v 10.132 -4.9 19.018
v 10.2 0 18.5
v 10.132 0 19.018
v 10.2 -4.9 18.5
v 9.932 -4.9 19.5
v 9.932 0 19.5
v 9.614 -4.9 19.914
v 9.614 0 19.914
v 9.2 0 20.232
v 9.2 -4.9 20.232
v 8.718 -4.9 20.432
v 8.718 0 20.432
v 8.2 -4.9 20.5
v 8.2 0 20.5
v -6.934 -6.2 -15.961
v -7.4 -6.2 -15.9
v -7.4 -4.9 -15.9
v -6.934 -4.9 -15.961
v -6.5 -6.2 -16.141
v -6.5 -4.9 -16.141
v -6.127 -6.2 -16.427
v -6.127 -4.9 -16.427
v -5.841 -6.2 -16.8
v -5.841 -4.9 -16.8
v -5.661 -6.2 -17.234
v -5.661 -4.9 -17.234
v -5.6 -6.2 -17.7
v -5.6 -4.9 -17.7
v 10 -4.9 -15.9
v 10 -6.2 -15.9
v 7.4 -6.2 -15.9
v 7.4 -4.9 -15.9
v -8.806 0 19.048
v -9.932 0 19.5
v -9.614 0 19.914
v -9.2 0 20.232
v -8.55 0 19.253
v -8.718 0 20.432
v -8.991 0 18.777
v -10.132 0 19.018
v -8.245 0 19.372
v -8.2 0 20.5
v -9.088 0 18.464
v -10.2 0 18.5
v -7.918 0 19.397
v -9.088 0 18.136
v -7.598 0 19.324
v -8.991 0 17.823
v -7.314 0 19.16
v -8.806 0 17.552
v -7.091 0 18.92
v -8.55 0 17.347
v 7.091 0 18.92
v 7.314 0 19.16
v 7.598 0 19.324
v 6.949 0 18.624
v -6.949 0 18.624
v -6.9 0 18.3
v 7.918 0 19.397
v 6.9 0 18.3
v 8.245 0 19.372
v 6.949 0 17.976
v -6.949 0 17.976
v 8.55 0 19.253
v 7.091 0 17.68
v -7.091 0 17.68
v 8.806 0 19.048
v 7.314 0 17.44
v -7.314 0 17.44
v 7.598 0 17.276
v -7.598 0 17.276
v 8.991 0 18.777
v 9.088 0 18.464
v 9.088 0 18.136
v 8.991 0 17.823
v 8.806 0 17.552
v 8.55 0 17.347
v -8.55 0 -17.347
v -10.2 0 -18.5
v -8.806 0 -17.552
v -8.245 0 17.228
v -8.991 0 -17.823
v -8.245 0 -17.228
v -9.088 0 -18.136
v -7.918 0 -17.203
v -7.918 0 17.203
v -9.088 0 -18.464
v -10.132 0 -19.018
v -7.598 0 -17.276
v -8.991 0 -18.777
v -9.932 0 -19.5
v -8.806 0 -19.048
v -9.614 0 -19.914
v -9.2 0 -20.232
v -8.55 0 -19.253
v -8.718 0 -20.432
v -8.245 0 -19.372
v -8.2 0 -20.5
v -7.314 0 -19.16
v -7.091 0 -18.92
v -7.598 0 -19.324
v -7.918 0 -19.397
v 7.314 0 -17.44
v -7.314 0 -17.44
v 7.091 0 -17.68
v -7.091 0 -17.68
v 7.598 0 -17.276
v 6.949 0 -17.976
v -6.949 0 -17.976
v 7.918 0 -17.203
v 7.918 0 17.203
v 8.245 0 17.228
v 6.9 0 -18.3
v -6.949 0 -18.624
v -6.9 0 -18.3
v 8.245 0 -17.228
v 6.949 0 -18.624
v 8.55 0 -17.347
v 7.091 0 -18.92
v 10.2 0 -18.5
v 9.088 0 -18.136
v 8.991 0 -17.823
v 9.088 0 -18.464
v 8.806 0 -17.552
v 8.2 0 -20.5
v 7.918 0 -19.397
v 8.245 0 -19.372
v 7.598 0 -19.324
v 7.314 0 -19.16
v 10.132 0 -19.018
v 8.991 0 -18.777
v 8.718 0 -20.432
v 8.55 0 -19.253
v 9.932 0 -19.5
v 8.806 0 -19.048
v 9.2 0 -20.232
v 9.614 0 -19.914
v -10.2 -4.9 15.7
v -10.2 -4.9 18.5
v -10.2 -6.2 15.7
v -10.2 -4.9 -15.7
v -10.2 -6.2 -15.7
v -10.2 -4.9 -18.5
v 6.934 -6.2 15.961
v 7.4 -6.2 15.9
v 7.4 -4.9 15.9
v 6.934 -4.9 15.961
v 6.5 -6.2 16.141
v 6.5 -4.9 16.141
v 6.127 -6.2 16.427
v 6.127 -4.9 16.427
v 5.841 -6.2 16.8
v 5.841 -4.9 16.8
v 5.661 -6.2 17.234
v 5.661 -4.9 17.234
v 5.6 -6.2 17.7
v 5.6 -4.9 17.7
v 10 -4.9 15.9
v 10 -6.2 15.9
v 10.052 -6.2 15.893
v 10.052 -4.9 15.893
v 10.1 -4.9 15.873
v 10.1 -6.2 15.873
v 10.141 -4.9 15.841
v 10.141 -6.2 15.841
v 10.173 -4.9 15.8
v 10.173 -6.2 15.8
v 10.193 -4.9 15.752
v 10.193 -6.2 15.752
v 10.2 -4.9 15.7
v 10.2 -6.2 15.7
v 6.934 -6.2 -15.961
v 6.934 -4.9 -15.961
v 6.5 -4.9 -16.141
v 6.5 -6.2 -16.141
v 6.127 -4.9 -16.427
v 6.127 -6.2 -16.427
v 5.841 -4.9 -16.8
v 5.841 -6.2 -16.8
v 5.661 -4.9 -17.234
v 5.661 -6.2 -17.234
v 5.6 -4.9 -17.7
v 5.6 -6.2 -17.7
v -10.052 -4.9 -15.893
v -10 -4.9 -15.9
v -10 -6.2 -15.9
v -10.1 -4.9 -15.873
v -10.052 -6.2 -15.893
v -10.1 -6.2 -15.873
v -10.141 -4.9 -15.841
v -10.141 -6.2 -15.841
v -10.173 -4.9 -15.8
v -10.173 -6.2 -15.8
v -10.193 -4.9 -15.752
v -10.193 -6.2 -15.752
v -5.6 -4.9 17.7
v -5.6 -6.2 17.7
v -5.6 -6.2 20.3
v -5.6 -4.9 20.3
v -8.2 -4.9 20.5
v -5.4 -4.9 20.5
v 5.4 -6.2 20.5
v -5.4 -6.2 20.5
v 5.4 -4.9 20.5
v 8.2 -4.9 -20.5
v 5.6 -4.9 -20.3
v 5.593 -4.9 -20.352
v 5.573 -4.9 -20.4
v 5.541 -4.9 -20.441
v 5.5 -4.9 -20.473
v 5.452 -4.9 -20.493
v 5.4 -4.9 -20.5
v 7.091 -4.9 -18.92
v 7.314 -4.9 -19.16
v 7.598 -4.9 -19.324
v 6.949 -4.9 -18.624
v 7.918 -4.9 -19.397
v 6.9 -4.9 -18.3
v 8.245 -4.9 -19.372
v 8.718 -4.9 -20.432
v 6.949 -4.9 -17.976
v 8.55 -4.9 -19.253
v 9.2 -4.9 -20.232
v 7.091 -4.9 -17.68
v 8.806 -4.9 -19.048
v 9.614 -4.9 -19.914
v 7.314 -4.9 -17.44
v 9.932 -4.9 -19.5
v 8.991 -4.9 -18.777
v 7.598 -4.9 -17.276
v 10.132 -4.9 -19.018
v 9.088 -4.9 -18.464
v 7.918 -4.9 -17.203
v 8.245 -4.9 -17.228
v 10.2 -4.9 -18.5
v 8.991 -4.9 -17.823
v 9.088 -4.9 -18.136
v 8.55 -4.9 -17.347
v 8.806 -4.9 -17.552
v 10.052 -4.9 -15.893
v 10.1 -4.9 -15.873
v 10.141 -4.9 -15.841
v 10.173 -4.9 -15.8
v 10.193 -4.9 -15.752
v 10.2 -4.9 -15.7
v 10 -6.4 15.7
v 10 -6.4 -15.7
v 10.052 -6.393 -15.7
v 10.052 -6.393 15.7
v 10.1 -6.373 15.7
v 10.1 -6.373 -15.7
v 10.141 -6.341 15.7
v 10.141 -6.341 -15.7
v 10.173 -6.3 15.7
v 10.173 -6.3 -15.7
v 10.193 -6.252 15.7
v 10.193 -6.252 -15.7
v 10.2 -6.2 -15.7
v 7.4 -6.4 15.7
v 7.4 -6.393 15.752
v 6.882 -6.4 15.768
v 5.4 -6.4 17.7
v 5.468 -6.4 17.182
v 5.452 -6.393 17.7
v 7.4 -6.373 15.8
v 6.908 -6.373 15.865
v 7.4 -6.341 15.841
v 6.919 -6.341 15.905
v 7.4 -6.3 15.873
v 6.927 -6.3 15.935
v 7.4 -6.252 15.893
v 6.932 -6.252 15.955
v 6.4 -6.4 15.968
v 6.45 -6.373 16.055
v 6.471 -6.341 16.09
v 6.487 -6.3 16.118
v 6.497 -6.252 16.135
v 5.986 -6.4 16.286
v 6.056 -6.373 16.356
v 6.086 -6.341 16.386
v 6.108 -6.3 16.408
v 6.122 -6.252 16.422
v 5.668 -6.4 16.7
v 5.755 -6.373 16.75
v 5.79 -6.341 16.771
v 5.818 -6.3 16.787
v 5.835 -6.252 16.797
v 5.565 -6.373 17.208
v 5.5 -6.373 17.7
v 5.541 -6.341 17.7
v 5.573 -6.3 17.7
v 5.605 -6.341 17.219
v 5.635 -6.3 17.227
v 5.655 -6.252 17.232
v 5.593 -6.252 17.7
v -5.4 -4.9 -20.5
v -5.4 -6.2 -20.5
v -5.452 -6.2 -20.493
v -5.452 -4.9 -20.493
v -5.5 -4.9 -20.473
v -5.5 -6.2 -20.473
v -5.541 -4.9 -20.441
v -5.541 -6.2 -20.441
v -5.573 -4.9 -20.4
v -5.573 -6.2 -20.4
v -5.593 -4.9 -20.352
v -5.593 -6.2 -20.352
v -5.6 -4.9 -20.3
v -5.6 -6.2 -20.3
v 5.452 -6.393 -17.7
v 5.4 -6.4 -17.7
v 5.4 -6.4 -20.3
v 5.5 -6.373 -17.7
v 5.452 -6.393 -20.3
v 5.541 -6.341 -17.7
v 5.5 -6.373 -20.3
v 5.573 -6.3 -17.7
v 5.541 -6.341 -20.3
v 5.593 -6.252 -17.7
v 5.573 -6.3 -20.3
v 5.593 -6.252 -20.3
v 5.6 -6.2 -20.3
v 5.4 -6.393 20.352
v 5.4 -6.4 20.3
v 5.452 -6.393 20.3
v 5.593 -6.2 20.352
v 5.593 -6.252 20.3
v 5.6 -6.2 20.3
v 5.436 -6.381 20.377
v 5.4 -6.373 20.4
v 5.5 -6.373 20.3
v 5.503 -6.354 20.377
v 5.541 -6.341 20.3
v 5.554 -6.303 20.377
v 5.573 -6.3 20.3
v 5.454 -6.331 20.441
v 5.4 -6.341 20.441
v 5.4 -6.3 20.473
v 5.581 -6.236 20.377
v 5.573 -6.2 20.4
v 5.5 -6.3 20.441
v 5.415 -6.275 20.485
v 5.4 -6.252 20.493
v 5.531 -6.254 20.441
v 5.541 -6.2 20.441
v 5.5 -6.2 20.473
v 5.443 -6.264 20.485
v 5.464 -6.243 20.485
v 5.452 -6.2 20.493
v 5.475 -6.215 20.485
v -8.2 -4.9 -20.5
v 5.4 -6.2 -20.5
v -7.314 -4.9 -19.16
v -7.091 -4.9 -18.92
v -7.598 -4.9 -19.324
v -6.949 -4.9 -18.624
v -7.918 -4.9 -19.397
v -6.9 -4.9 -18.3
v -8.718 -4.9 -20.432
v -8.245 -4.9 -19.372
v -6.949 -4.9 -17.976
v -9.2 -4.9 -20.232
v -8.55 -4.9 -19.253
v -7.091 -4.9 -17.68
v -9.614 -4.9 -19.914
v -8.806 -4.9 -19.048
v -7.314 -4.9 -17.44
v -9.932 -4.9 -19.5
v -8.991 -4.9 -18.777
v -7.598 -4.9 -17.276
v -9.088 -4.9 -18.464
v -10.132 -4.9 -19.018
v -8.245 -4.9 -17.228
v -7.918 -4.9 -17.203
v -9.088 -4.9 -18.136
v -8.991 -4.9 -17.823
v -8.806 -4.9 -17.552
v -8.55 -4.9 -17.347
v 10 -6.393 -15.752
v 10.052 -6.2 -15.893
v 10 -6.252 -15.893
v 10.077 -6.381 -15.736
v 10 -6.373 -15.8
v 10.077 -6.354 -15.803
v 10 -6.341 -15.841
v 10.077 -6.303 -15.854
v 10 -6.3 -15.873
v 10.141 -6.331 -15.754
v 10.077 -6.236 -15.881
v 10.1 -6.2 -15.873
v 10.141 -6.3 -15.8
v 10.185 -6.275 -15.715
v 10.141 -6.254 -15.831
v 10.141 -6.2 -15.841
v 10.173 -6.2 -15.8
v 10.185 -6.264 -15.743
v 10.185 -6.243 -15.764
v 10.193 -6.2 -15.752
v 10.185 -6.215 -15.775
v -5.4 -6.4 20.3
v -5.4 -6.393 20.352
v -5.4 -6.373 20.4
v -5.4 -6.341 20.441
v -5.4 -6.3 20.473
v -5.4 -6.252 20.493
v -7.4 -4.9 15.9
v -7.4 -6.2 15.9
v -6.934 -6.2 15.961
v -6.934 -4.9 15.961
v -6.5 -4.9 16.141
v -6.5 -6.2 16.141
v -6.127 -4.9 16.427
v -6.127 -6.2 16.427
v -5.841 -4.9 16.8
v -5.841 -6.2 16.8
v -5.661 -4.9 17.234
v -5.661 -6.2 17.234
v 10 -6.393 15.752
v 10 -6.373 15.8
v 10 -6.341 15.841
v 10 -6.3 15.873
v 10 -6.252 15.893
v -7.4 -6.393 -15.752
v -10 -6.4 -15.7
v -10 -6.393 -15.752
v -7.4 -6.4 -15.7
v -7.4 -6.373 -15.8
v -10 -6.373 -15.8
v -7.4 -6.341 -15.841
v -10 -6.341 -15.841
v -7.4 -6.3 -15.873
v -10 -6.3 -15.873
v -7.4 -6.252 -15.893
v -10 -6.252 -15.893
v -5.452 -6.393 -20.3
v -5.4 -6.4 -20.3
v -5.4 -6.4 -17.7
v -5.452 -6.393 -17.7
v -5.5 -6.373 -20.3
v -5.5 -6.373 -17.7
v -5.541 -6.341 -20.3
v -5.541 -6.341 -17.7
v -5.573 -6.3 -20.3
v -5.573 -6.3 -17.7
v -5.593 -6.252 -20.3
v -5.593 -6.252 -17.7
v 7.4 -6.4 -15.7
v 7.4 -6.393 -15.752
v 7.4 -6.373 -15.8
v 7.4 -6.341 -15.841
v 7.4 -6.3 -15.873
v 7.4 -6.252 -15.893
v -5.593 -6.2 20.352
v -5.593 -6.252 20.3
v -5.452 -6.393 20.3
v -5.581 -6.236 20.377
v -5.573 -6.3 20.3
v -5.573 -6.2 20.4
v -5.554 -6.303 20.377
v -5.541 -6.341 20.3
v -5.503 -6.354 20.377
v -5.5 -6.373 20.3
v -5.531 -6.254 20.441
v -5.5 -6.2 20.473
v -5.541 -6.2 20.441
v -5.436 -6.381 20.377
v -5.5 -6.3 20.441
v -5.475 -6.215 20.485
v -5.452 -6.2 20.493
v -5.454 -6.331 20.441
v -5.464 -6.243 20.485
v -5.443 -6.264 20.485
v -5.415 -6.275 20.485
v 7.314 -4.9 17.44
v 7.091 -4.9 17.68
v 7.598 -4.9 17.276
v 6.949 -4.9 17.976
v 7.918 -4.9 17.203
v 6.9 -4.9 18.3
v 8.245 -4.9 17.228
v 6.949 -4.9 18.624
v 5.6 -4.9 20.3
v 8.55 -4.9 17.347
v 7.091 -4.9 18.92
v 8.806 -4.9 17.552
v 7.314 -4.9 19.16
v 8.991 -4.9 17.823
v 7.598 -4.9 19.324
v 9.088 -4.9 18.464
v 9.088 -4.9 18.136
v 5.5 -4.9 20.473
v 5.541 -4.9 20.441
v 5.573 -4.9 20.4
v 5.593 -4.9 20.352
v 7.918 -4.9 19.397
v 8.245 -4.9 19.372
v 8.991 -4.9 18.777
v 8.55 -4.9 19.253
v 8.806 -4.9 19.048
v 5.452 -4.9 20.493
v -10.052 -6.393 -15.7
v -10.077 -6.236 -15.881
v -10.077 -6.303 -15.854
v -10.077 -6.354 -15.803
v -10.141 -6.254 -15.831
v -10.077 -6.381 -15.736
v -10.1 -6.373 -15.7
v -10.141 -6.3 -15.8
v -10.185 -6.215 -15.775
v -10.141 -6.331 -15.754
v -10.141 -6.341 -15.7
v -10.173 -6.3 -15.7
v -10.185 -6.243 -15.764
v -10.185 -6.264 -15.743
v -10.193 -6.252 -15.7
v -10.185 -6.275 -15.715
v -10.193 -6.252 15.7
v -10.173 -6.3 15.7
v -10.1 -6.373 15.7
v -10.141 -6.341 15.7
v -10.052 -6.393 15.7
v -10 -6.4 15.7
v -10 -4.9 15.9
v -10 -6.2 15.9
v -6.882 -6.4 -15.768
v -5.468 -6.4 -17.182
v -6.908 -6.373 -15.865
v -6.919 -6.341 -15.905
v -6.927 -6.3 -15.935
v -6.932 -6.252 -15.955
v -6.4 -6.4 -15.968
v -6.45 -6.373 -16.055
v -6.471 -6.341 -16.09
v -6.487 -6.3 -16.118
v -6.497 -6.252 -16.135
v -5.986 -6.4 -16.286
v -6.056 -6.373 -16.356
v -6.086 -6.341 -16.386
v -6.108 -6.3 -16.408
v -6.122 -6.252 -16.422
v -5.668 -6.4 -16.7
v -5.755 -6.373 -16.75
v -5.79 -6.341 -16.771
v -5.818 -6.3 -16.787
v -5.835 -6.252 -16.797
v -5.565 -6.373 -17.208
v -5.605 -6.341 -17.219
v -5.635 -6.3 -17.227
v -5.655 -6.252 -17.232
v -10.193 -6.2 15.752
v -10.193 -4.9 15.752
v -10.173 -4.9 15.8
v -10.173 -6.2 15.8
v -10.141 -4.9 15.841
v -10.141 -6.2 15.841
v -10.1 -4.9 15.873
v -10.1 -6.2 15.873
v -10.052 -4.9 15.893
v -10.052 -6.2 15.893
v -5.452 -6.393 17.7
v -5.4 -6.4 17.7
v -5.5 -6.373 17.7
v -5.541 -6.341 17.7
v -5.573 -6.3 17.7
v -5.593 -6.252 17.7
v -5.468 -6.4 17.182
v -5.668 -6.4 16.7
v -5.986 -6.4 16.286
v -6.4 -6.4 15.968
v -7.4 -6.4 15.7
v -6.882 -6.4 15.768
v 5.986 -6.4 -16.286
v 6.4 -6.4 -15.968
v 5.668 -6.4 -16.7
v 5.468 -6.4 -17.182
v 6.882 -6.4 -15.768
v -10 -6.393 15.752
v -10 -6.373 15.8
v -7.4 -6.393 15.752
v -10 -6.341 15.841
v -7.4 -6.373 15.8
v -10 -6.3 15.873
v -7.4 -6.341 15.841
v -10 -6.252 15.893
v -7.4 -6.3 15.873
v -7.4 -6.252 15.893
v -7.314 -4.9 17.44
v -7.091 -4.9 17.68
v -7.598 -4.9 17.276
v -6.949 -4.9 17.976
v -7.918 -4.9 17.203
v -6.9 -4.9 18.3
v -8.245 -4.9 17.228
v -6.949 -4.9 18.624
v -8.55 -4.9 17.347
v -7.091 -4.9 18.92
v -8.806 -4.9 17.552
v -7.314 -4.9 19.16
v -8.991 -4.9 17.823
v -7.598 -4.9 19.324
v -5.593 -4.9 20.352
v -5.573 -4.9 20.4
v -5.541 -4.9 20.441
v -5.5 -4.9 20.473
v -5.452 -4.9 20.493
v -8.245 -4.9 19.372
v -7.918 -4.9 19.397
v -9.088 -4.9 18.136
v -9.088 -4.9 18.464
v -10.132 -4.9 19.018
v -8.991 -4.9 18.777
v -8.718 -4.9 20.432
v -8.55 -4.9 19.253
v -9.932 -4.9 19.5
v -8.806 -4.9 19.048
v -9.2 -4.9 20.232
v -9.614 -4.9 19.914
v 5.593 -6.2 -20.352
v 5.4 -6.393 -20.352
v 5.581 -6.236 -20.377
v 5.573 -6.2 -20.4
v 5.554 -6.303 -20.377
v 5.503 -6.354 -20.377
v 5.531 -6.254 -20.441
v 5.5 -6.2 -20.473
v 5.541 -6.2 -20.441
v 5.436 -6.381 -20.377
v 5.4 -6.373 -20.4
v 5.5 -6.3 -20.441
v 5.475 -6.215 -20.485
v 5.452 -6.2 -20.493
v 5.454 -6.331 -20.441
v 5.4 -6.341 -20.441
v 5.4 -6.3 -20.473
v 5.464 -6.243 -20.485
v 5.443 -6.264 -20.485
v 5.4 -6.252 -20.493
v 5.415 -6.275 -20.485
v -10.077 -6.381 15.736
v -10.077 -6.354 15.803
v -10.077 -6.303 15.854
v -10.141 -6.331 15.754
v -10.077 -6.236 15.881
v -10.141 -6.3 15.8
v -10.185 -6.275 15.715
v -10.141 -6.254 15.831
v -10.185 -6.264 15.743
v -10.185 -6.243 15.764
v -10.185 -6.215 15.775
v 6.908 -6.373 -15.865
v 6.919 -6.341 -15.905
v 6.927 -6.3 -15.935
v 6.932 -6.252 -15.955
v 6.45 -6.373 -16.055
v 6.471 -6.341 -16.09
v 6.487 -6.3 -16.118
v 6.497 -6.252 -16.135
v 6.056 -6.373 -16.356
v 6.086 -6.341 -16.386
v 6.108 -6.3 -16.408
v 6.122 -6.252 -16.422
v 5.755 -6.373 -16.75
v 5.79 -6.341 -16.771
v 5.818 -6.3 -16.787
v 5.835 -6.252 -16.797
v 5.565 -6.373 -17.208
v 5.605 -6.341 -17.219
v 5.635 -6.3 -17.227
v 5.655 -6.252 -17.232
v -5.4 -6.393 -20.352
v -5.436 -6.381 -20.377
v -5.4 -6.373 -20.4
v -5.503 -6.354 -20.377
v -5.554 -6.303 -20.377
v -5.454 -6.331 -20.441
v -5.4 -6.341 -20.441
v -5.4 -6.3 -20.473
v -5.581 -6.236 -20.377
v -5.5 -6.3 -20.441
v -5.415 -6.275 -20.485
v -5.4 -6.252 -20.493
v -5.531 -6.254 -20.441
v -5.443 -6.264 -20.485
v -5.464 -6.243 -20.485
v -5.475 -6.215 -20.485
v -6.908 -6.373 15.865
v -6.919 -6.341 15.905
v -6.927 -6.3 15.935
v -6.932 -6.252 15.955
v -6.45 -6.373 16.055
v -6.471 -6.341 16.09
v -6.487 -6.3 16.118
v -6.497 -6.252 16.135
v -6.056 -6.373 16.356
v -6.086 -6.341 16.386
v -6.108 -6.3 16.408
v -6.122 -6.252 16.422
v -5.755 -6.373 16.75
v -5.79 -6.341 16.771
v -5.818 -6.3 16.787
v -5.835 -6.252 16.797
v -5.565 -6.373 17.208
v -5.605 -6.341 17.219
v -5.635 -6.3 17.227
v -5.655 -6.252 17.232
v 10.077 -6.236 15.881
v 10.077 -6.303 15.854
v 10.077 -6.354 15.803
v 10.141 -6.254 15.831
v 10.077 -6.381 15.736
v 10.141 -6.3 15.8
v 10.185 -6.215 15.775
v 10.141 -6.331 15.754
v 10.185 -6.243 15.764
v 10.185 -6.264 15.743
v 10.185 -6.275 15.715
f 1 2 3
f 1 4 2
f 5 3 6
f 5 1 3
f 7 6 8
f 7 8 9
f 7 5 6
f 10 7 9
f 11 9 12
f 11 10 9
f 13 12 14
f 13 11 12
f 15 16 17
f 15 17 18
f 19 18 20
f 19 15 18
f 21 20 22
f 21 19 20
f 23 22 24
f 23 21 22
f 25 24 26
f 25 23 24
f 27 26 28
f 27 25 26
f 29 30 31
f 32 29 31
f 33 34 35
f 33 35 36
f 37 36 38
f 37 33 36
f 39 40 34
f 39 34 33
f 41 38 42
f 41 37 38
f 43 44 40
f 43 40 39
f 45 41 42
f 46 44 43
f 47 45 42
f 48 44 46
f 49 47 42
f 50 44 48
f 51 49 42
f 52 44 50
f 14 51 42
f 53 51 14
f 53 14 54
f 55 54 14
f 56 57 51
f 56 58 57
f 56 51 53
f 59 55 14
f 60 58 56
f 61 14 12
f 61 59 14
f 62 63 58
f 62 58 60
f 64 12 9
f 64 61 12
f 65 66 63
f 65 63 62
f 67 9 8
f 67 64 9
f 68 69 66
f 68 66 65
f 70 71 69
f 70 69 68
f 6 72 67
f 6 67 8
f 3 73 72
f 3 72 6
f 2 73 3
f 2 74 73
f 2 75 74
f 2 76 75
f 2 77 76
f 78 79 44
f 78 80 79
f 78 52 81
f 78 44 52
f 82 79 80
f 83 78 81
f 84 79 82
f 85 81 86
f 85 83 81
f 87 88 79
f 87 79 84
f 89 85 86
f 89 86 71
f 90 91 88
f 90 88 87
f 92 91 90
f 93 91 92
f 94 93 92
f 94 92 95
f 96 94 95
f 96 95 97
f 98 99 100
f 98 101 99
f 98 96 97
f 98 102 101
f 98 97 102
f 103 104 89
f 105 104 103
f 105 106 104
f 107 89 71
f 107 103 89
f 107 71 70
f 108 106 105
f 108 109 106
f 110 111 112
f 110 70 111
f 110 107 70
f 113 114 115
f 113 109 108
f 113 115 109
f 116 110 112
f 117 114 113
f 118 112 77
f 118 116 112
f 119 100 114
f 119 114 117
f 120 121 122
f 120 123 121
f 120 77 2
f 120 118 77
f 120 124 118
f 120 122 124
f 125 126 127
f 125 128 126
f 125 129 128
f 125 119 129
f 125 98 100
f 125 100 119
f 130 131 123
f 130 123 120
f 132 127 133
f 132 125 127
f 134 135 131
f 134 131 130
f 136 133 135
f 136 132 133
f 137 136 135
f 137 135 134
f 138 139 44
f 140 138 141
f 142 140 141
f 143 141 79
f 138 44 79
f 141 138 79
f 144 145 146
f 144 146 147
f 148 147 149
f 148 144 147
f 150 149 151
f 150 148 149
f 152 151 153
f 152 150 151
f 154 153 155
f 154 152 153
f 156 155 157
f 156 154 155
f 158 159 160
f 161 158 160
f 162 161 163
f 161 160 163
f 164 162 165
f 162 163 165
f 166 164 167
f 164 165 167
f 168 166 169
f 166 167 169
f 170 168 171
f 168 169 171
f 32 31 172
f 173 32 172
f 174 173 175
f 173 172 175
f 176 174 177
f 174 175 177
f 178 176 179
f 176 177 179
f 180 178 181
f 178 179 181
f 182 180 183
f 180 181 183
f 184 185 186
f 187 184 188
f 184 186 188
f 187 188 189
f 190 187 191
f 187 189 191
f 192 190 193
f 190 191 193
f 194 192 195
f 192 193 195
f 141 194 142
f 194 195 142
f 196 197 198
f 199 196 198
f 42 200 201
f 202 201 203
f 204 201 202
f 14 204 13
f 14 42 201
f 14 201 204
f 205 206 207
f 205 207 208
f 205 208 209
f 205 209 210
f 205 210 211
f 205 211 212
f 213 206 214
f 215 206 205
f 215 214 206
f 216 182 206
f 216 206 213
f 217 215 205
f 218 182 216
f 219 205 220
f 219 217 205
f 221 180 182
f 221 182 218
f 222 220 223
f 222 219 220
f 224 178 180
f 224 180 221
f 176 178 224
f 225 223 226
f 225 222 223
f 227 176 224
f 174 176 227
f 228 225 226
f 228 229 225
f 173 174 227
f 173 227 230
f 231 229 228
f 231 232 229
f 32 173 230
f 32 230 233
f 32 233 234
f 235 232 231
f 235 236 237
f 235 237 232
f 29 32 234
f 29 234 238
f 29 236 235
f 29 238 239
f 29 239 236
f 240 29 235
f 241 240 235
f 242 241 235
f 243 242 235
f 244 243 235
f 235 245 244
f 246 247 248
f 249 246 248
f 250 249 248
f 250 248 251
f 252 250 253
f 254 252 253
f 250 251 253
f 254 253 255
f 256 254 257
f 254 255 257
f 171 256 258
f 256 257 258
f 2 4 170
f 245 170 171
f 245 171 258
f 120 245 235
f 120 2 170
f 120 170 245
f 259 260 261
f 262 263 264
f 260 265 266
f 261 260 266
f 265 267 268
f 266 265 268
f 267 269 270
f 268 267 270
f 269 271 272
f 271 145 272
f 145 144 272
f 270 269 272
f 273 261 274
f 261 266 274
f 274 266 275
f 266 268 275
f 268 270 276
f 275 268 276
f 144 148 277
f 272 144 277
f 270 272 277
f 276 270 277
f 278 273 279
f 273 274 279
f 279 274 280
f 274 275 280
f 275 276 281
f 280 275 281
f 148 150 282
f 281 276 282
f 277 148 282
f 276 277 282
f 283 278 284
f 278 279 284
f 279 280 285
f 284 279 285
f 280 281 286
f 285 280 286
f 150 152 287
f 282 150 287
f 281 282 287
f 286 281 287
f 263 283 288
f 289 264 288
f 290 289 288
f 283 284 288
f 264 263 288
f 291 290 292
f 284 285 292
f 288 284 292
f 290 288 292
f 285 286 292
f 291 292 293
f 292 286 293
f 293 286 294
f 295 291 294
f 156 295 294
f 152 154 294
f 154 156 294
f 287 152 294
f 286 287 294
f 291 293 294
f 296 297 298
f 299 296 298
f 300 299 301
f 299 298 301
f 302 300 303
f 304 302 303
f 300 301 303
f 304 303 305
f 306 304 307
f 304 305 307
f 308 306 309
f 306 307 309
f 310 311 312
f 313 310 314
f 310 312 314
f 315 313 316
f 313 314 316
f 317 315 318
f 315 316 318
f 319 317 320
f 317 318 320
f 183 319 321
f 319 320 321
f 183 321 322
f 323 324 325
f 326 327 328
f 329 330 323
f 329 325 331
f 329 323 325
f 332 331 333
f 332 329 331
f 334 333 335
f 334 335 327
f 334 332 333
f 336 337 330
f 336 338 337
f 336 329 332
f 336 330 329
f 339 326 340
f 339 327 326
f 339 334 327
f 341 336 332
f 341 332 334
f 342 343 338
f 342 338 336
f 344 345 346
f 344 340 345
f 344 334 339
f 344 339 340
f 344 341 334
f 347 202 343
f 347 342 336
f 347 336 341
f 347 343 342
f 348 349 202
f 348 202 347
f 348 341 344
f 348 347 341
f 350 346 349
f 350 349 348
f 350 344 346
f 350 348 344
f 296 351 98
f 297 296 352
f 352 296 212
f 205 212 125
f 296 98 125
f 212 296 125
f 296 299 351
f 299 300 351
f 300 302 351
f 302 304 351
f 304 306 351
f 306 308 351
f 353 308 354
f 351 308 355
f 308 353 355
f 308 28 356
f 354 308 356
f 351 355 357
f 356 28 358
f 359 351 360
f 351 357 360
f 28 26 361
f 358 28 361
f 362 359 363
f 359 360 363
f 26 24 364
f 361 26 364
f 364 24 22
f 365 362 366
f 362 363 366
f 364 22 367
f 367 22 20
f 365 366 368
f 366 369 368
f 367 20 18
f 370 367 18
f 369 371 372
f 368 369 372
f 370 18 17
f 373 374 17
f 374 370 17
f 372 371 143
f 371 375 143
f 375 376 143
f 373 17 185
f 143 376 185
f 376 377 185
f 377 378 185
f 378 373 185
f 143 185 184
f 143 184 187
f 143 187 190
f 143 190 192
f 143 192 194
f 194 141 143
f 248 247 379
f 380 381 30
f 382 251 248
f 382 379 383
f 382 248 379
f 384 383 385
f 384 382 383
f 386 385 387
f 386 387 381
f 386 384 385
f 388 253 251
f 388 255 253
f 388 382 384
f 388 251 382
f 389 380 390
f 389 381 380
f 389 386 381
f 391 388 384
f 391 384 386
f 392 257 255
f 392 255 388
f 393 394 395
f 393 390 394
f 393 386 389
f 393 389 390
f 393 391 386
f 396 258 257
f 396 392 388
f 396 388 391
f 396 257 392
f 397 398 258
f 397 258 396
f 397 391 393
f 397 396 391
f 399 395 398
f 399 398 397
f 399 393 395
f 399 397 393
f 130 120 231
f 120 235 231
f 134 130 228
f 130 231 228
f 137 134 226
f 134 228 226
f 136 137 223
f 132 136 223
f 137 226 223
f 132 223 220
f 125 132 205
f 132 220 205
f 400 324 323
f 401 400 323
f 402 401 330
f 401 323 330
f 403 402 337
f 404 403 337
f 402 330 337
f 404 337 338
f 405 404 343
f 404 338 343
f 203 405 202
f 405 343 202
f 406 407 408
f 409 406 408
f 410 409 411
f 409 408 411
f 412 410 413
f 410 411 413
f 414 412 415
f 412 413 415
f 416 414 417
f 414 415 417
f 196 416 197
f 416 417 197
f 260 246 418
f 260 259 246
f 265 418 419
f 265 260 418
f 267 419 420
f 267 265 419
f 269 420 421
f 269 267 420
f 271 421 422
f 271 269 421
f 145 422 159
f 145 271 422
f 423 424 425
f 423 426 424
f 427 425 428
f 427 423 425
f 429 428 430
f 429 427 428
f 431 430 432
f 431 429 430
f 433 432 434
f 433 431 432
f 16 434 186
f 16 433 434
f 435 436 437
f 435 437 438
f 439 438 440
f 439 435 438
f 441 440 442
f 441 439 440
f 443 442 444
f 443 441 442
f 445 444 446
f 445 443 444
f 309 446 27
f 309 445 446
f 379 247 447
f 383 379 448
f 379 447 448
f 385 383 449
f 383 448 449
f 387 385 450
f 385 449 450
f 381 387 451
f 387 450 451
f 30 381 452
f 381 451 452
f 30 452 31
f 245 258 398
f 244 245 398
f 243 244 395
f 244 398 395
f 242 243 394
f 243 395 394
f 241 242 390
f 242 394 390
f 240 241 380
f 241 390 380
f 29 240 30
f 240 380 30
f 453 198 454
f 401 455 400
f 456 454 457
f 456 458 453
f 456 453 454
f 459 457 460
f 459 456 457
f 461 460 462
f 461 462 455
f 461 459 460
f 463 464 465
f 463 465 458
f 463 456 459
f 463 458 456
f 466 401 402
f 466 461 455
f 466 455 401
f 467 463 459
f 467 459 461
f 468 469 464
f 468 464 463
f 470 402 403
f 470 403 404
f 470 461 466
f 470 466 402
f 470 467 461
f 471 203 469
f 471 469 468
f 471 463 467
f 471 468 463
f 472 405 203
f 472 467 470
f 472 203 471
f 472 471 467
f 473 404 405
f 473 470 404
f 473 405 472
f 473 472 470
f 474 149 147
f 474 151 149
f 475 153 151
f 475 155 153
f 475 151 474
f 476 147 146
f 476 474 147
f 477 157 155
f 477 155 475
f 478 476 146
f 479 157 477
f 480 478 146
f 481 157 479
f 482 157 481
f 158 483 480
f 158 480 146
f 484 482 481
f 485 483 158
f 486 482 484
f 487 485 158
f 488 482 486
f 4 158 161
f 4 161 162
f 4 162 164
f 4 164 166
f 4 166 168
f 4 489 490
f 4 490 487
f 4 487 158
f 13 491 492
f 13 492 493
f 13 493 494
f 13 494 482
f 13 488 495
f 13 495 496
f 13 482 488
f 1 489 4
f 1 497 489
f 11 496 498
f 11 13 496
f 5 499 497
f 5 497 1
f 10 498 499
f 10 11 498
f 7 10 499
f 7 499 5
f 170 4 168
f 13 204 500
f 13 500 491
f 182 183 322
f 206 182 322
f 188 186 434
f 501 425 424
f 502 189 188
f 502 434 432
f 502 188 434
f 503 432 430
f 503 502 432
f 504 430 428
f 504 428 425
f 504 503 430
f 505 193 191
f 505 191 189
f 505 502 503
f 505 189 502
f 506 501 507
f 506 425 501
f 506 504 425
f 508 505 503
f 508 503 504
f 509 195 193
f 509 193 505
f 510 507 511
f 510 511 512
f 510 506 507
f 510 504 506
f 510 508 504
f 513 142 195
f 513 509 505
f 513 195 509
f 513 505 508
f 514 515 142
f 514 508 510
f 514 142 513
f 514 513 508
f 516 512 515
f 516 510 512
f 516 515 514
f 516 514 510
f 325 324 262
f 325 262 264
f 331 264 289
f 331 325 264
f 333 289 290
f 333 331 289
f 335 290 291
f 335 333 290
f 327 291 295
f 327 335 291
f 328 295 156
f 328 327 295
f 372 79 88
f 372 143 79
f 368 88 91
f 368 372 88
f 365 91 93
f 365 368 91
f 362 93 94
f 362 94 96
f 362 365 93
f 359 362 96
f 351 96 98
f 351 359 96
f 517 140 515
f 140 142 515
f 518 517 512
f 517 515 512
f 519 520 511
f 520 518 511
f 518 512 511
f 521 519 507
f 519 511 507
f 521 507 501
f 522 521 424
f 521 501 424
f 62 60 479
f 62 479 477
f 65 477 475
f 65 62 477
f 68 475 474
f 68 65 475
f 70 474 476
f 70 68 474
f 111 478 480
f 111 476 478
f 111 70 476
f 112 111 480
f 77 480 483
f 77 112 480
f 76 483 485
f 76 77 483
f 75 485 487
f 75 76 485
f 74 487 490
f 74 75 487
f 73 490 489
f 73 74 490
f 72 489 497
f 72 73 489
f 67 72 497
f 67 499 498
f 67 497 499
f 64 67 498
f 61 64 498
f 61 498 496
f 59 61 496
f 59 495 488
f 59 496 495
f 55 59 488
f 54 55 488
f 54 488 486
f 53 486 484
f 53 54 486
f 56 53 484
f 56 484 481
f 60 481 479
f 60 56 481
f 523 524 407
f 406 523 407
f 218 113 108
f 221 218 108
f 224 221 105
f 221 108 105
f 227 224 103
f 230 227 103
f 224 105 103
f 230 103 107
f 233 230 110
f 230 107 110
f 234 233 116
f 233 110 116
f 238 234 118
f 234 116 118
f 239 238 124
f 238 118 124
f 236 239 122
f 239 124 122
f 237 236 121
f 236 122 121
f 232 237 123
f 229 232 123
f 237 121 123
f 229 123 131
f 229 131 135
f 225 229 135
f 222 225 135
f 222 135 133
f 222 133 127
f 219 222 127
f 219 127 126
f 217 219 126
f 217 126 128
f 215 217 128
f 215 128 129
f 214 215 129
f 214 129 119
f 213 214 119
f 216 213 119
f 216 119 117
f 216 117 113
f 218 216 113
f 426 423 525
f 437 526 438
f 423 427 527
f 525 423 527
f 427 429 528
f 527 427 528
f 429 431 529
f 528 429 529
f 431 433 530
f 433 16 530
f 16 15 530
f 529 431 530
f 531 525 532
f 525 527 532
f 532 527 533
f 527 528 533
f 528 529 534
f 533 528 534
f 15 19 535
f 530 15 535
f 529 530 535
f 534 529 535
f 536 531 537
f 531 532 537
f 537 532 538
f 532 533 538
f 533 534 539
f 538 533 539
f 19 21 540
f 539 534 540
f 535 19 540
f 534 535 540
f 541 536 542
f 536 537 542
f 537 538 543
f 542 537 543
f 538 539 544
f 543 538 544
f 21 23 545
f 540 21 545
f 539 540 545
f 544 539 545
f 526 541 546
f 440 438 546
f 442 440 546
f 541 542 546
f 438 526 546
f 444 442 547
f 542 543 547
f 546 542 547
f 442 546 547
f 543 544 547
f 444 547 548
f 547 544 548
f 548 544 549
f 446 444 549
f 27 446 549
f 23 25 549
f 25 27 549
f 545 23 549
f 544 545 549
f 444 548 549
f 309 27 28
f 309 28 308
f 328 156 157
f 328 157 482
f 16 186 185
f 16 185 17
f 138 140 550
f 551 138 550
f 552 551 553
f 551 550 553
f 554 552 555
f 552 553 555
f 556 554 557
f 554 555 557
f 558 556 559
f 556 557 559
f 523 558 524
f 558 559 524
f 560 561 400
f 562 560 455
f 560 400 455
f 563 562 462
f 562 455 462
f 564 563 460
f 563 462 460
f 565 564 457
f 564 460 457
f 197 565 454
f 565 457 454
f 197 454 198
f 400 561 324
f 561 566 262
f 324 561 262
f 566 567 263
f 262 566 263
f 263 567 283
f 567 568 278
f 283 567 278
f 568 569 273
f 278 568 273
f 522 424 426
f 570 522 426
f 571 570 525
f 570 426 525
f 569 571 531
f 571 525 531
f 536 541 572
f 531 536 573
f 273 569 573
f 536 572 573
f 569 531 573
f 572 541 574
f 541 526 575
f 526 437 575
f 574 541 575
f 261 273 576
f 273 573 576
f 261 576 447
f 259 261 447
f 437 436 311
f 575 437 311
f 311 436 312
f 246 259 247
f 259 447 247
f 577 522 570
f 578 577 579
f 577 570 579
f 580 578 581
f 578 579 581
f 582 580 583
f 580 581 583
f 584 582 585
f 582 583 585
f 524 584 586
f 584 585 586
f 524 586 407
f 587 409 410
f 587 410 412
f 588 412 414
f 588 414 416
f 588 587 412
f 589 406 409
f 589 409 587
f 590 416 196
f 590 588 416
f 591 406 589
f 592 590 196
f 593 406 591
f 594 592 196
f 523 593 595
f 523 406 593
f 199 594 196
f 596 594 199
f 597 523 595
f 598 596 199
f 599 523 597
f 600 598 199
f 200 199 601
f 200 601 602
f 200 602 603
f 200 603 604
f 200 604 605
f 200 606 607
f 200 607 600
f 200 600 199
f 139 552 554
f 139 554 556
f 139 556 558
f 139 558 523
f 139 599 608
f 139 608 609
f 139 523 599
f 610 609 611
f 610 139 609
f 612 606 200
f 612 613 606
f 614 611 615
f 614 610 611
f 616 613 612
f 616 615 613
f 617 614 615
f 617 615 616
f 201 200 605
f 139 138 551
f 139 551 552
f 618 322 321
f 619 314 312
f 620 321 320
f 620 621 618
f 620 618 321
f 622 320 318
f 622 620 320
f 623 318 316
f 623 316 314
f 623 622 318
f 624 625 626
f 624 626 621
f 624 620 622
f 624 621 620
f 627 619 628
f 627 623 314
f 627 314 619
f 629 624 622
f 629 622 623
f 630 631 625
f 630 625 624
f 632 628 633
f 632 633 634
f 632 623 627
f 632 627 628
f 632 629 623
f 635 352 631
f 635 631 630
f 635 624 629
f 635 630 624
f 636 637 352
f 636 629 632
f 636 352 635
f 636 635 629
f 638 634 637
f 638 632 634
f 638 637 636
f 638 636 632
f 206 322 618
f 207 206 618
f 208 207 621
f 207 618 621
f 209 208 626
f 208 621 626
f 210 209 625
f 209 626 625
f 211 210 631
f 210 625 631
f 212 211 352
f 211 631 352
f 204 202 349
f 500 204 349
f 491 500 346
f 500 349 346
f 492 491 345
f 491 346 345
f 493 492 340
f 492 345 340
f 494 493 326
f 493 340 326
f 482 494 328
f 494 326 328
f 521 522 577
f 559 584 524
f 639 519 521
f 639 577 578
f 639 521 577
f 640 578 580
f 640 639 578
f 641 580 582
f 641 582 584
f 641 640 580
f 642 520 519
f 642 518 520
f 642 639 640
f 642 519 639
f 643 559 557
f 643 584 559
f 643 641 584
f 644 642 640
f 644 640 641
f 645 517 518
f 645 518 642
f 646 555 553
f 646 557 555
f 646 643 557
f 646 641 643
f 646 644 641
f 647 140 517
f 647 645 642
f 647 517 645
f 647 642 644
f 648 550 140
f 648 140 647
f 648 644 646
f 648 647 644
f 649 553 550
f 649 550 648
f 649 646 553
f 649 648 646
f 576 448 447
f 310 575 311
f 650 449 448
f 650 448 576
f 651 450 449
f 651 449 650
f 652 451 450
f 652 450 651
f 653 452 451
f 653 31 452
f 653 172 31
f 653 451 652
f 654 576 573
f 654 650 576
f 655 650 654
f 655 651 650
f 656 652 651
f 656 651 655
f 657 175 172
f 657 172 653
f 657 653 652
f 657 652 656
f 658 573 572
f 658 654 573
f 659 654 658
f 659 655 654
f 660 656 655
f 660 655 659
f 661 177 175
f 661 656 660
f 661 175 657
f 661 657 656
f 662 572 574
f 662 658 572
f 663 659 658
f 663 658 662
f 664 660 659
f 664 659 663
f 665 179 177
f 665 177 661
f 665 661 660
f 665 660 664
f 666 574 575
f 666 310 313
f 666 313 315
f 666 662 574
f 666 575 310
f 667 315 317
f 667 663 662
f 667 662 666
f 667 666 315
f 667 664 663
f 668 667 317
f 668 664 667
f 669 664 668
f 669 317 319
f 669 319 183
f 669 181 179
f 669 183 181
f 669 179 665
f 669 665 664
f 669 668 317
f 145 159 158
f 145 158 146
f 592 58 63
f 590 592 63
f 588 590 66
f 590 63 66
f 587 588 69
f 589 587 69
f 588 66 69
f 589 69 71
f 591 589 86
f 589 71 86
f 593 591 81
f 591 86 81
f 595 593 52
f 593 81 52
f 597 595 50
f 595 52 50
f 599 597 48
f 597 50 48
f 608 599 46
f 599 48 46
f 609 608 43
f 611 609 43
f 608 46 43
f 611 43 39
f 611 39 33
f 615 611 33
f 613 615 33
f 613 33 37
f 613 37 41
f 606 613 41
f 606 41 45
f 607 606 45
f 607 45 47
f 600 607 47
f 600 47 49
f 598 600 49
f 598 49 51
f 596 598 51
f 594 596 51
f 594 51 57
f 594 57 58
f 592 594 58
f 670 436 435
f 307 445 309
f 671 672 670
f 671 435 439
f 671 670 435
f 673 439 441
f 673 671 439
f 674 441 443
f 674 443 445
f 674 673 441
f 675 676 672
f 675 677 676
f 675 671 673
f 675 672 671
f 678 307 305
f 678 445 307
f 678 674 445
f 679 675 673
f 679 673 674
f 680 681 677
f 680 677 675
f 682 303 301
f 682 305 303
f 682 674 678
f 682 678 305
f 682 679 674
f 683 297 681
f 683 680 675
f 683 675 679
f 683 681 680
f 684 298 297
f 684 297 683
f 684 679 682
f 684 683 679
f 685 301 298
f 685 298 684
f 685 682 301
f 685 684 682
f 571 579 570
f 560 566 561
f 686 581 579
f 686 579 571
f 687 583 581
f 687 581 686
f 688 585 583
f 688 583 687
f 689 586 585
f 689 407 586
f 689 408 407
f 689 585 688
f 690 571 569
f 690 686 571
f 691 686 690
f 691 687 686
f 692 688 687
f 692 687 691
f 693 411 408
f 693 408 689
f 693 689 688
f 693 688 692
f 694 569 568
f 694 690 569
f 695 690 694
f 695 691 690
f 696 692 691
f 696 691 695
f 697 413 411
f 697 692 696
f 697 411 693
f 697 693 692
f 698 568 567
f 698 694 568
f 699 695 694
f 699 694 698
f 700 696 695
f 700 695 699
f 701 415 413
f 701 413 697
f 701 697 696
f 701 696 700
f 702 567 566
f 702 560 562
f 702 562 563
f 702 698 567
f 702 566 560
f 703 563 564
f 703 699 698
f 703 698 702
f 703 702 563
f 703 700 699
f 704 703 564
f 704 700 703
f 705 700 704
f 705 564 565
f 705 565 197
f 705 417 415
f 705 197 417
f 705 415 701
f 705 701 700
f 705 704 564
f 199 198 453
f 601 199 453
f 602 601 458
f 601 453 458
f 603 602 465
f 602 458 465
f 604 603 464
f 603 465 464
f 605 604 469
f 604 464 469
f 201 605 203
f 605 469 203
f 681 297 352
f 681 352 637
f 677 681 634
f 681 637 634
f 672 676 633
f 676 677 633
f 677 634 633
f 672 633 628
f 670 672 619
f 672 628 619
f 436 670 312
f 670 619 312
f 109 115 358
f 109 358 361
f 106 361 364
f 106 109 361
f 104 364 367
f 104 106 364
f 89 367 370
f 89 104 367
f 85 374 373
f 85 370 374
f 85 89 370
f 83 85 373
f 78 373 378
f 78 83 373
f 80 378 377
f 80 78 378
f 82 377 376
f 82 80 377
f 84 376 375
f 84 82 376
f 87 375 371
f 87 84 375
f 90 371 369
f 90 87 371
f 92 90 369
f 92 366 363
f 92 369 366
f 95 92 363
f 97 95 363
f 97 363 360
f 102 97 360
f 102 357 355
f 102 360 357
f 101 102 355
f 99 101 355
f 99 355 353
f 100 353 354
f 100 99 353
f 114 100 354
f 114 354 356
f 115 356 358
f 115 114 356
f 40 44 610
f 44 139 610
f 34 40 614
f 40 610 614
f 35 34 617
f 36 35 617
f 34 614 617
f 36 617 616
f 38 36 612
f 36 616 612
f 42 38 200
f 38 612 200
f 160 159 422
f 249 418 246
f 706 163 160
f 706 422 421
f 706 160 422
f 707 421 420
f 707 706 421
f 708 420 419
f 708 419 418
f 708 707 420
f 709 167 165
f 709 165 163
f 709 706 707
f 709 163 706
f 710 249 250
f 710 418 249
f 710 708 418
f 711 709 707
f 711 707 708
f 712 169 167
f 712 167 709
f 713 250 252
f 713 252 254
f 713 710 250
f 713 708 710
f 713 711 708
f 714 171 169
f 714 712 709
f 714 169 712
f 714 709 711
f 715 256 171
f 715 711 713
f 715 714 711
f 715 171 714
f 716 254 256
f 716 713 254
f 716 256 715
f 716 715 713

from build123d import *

# Parameters (mm, degrees)
SKETCH1_W            = 20.4
SKETCH1_H            = 41
BOSS_EXTRUDE1_DEPTH  = 6.4
CUT_EXTRUDE1_DEPTH   = 1.5
M2_CLEARANCE_HOLE1_D = 2.2
MIRROR2_COPY_1_DEPTH = 1.5
MIRROR2_COPY_2_D     = 2.2
FILLET1_R            = 0.2
FILLET2_R            = 0.2
FILLET3_R            = 2


with BuildPart() as part:
    # Sketch1 → Boss-Extrude1 (new body)
    with BuildSketch(Plane(origin=(0, 0, 0), x_dir=(1, 0, 0), z_dir=(0, 1, 0))):
        Rectangle(SKETCH1_W, SKETCH1_H)
    extrude(amount=-BOSS_EXTRUDE1_DEPTH)

    # Sketch2 → Cut-Extrude1 (cut)
    with BuildSketch(Plane(origin=(0, -6.4, 0), x_dir=(-1, 0, 0), z_dir=(0, -1, 0))):
        with BuildLine():
            Line((5.6, -17.7), (5.6, -20.5))
            Line((5.6, -20.5), (10.2, -20.5))
            Line((10.2, -20.5), (10.2, -15.9))
            Line((10.2, -15.9), (7.4, -15.9))
            ThreePointArc((7.4, -15.9), (6.127207794, -16.427207794), (5.6, -17.7))
        make_face()
    cut_extrude1 = extrude(amount=-CUT_EXTRUDE1_DEPTH, mode=Mode.SUBTRACT)

    # M2 Clearance Hole1 (through all)
    with Locations(Plane(origin=(0, -4.9, 0), x_dir=(-1, 0, 0), z_dir=(0, -1, 0))):
        with Locations((8, -18.3)):
            m2_clearance_hole1 = Hole(M2_CLEARANCE_HOLE1_D / 2)

    # Mirror1: Cut-Extrude1, M2 Clearance Hole1 across plane
    add(cut_extrude1.mirror(Plane(origin=(0, 0, 0), x_dir=(0, 0, 1), z_dir=(1, 0, 0))), mode=Mode.SUBTRACT)
    add(m2_clearance_hole1.mirror(Plane(origin=(0, 0, 0), x_dir=(0, 0, 1), z_dir=(1, 0, 0))), mode=Mode.SUBTRACT)

    # Mirror2: Cut-Extrude1, M2 Clearance Hole1 across plane
    add(cut_extrude1.mirror(Plane.XY), mode=Mode.SUBTRACT)
    add(m2_clearance_hole1.mirror(Plane.XY), mode=Mode.SUBTRACT)

    # Mirror2 copy 1 sketch → Mirror2 copy 1 (cut)
    with BuildSketch(Plane.XZ.offset(6.4)):
        with BuildLine():
            Line((5.6, -17.7), (5.6, -20.5))
            Line((5.6, -20.5), (10.2, -20.5))
            Line((10.2, -20.5), (10.2, -15.9))
            Line((10.2, -15.9), (7.4, -15.9))
            ThreePointArc((7.4, -15.9), (6.127207794, -16.427207794), (5.6, -17.7))
        make_face()
    extrude(amount=-MIRROR2_COPY_1_DEPTH, mode=Mode.SUBTRACT)

    # Mirror2 copy 2 (through all)
    with Locations(Plane.XZ.offset(4.9)):
        with Locations((8, -18.3)):
            Hole(MIRROR2_COPY_2_D / 2)

    # Fillet1
    fillet1_edges = [part.edges().sort_by_distance(p)[0] for p in [
        (0, -6.4, 20.5),
        (-6.127207794, -6.4, 16.427207794),
        (-5.6, -6.4, 19.1),
        (-8.8, -6.4, 15.9),
        (10.2, -6.4, 0),
        (6.127207794, -6.4, 16.427207794),
        (5.6, -6.4, 19.1),
        (8.8, -6.4, 15.9),
        (-10.2, -6.4, 0),
        (-6.127207794, -6.4, -16.427207794),
        (-5.6, -6.4, -19.1),
        (-8.8, -6.4, -15.9),
        (0, -6.4, -20.5),
        (6.127207794, -6.4, -16.427207794),
        (5.6, -6.4, -19.1),
        (8.8, -6.4, -15.9),
    ]]
    fillet(fillet1_edges, radius=FILLET1_R)

    # Fillet2
    # the kernel refuses this fillet: 0.2 mm, written as the material it takes off along each edge
    with BuildSketch(Plane(origin=(-5.4, -6.2, 20.3), x_dir=(-1, 0, 0), z_dir=(0, 0, 1))) as fillet2_piece_1_section:
        Polygon((0, 0), (FILLET2_R, 0), (FILLET2_R, FILLET2_R), (0, FILLET2_R), align=None)
    fillet2_piece_1 = extrude(amount=FILLET2_R, mode=Mode.PRIVATE)
    fillet2_piece_1 = fillet2_piece_1 - Plane(origin=(-5.4, -6.2, 20.3), x_dir=(0.7071067811865475, 0.7071067811865475, 0), z_dir=(0, 0, 1)) * Sphere(FILLET2_R, mode=Mode.PRIVATE)
    add(fillet2_piece_1, mode=Mode.SUBTRACT)
    with BuildSketch(Plane(origin=(5.4, -6.2, 20.3), x_dir=(1, 0, 0), z_dir=(0, 0, 1))) as fillet2_piece_2_section:
        Polygon((0, 0), (FILLET2_R, 0), (FILLET2_R, -FILLET2_R), (0, -FILLET2_R), align=None)
    fillet2_piece_2 = extrude(amount=FILLET2_R, mode=Mode.PRIVATE)
    fillet2_piece_2 = fillet2_piece_2 - Plane(origin=(5.4, -6.2, 20.3), x_dir=(-0.7071067811865475, 0.7071067811865475, 0), z_dir=(0, 0, 1)) * Sphere(FILLET2_R, mode=Mode.PRIVATE)
    add(fillet2_piece_2, mode=Mode.SUBTRACT)
    with BuildSketch(Plane(origin=(-10, -6.2, 15.7), x_dir=(0, 0, 1), z_dir=(-1, 0, 0))) as fillet2_piece_3_section:
        Polygon((0, 0), (FILLET2_R, 0), (FILLET2_R, -FILLET2_R), (0, -FILLET2_R), align=None)
    fillet2_piece_3 = extrude(amount=FILLET2_R, mode=Mode.PRIVATE)
    fillet2_piece_3 = fillet2_piece_3 - Plane(origin=(-10, -6.2, 15.7), x_dir=(0, 0.7071067811865475, -0.7071067811865475), z_dir=(-1, 0, 0)) * Sphere(FILLET2_R, mode=Mode.PRIVATE)
    add(fillet2_piece_3, mode=Mode.SUBTRACT)
    with BuildSketch(Plane(origin=(-10, -6.2, -15.7), x_dir=(0, 0, -1), z_dir=(-1, 0, 0))) as fillet2_piece_4_section:
        Polygon((0, 0), (FILLET2_R, 0), (FILLET2_R, FILLET2_R), (0, FILLET2_R), align=None)
    fillet2_piece_4 = extrude(amount=FILLET2_R, mode=Mode.PRIVATE)
    fillet2_piece_4 = fillet2_piece_4 - Plane(origin=(-10, -6.2, -15.7), x_dir=(0, 0.7071067811865475, 0.7071067811865475), z_dir=(-1, 0, 0)) * Sphere(FILLET2_R, mode=Mode.PRIVATE)
    add(fillet2_piece_4, mode=Mode.SUBTRACT)
    with BuildSketch(Plane(origin=(10, -6.2, 15.7), x_dir=(0, 0, 1), z_dir=(1, 0, 0))) as fillet2_piece_5_section:
        Polygon((0, 0), (FILLET2_R, 0), (FILLET2_R, FILLET2_R), (0, FILLET2_R), align=None)
    fillet2_piece_5 = extrude(amount=FILLET2_R, mode=Mode.PRIVATE)
    fillet2_piece_5 = fillet2_piece_5 - Plane(origin=(10, -6.2, 15.7), x_dir=(0, 0.7071067811865475, -0.7071067811865475), z_dir=(1, 0, 0)) * Sphere(FILLET2_R, mode=Mode.PRIVATE)
    add(fillet2_piece_5, mode=Mode.SUBTRACT)
    with BuildSketch(Plane(origin=(10, -6.2, -15.7), x_dir=(0, 0, -1), z_dir=(1, 0, 0))) as fillet2_piece_6_section:
        Polygon((0, 0), (FILLET2_R, 0), (FILLET2_R, -FILLET2_R), (0, -FILLET2_R), align=None)
    fillet2_piece_6 = extrude(amount=FILLET2_R, mode=Mode.PRIVATE)
    fillet2_piece_6 = fillet2_piece_6 - Plane(origin=(10, -6.2, -15.7), x_dir=(0, 0.7071067811865475, 0.7071067811865475), z_dir=(1, 0, 0)) * Sphere(FILLET2_R, mode=Mode.PRIVATE)
    add(fillet2_piece_6, mode=Mode.SUBTRACT)
    with BuildSketch(Plane(origin=(-5.4, -6.2, -20.3), x_dir=(-1, 0, 0), z_dir=(0, 0, -1))) as fillet2_piece_7_section:
        Polygon((0, 0), (FILLET2_R, 0), (FILLET2_R, -FILLET2_R), (0, -FILLET2_R), align=None)
    fillet2_piece_7 = extrude(amount=FILLET2_R, mode=Mode.PRIVATE)
    fillet2_piece_7 = fillet2_piece_7 - Plane(origin=(-5.4, -6.2, -20.3), x_dir=(0.7071067811865475, 0.7071067811865475, 0), z_dir=(0, 0, -1)) * Sphere(FILLET2_R, mode=Mode.PRIVATE)
    add(fillet2_piece_7, mode=Mode.SUBTRACT)
    with BuildSketch(Plane(origin=(5.4, -6.2, -20.3), x_dir=(1, 0, 0), z_dir=(0, 0, -1))) as fillet2_piece_8_section:
        Polygon((0, 0), (FILLET2_R, 0), (FILLET2_R, FILLET2_R), (0, FILLET2_R), align=None)
    fillet2_piece_8 = extrude(amount=FILLET2_R, mode=Mode.PRIVATE)
    fillet2_piece_8 = fillet2_piece_8 - Plane(origin=(5.4, -6.2, -20.3), x_dir=(-0.7071067811865475, 0.7071067811865475, 0), z_dir=(0, 0, -1)) * Sphere(FILLET2_R, mode=Mode.PRIVATE)
    add(fillet2_piece_8, mode=Mode.SUBTRACT)
    with BuildSketch(Plane(origin=(-10.2, -6.2, 15.9), x_dir=(0, 0, -1), z_dir=(0, 1, 0)), Plane(origin=(5.6, -6.2, 20.5), x_dir=(-1, 0, 0), z_dir=(0, 1, 0)), Plane(origin=(-5.6, -6.2, -20.5), x_dir=(1, 0, 0), z_dir=(0, 1, 0)), Plane(origin=(10.2, -6.2, -15.9), x_dir=(0, 0, 1), z_dir=(0, 1, 0))) as fillet2_piece_9:
        with BuildLine():
            CenterArc((FILLET2_R, -FILLET2_R), FILLET2_R, 90, 90)
            Line((0, -FILLET2_R), (0, 0))
            Line((0, 0), (FILLET2_R, 0))
        make_face()
    extrude(amount=1.3, mode=Mode.SUBTRACT)
    with BuildSketch(Plane(origin=(-5.6, -6.2, 20.5), x_dir=(1, 0, 0), z_dir=(0, 1, 0)), Plane(origin=(10.2, -6.2, 15.9), x_dir=(0, 0, -1), z_dir=(0, 1, 0)), Plane(origin=(-10.2, -6.2, -15.9), x_dir=(0, 0, 1), z_dir=(0, 1, 0)), Plane(origin=(5.6, -6.2, -20.5), x_dir=(-1, 0, 0), z_dir=(0, 1, 0))) as fillet2_piece_10:
        with BuildLine():
            CenterArc((FILLET2_R, FILLET2_R), FILLET2_R, 180, 90)
            Line((0, FILLET2_R), (0, 0))
            Line((0, 0), (FILLET2_R, 0))
        make_face()
    extrude(amount=1.3, mode=Mode.SUBTRACT)

    # Fillet3
    fillet3_edges = [part.edges().sort_by_distance(p)[0] for p in [
        (-10.2, -2.45, 20.5),
        (10.2, -2.45, 20.5),
        (-10.2, -2.45, -20.5),
        (10.2, -2.45, -20.5),
    ]]
    fillet(fillet3_edges, radius=FILLET3_R)


solid = part.part
